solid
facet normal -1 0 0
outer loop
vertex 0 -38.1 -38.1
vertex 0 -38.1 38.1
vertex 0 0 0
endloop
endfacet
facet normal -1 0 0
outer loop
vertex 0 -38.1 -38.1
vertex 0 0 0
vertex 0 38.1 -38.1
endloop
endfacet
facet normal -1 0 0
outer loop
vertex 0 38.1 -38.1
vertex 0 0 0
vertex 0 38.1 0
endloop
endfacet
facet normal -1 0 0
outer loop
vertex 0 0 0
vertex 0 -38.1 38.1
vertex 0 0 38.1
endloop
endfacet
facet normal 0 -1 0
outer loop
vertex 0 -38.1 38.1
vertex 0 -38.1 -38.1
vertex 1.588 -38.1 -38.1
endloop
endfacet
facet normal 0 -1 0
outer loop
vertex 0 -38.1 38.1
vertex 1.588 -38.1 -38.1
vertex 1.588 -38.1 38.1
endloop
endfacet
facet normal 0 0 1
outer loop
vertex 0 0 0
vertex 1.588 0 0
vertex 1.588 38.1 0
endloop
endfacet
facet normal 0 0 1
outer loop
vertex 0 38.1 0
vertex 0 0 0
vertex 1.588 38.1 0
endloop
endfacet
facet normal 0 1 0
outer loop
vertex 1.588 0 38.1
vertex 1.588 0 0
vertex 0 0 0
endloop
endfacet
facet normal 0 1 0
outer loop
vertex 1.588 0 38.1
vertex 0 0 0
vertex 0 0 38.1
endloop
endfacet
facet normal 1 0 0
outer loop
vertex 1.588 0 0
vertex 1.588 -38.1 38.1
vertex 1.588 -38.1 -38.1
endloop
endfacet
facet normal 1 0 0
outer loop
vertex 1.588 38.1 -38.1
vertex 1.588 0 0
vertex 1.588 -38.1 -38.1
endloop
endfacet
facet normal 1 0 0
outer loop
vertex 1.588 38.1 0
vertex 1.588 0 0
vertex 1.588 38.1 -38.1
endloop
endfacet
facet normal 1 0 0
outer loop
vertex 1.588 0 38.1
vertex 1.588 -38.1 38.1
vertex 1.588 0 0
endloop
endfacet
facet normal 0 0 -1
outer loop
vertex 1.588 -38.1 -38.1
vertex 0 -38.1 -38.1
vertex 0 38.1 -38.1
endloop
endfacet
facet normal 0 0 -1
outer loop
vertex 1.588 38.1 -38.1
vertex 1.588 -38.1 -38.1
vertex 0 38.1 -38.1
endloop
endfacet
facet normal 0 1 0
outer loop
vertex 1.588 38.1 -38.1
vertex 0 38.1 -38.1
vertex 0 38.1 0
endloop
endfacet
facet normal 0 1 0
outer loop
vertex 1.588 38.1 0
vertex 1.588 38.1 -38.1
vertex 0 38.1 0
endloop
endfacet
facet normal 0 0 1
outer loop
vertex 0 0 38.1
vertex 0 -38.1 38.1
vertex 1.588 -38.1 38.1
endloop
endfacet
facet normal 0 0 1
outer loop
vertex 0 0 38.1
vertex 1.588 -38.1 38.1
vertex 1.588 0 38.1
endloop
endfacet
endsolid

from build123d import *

# Parameters (mm, degrees)
F0_W     = 76.2
F0_H     = 76.2
F1_DEPTH = 1.5875
F2_W     = 38.1
F2_H     = 38.1
F3_DEPTH = 25.4


# Not quite as in the source:
# - a length typed as a fraction of an inch, garbled in the dataset ("3 / 203.2 mm" for 3/8 in), is restored


with BuildPart() as f1:
    # F0 (on Right) → F1 (new body)
    with BuildSketch(Plane.YZ):
        Rectangle(F0_W, F0_H)
    extrude(amount=F1_DEPTH)

    # F2 (on face) → F3 (cut)
    with BuildSketch(Plane.YZ.offset(1.5875)):
        with Locations((19.05, 19.05)):
            Rectangle(F2_W, F2_H)
    extrude(amount=-F3_DEPTH, mode=Mode.SUBTRACT)


solid = f1.part
